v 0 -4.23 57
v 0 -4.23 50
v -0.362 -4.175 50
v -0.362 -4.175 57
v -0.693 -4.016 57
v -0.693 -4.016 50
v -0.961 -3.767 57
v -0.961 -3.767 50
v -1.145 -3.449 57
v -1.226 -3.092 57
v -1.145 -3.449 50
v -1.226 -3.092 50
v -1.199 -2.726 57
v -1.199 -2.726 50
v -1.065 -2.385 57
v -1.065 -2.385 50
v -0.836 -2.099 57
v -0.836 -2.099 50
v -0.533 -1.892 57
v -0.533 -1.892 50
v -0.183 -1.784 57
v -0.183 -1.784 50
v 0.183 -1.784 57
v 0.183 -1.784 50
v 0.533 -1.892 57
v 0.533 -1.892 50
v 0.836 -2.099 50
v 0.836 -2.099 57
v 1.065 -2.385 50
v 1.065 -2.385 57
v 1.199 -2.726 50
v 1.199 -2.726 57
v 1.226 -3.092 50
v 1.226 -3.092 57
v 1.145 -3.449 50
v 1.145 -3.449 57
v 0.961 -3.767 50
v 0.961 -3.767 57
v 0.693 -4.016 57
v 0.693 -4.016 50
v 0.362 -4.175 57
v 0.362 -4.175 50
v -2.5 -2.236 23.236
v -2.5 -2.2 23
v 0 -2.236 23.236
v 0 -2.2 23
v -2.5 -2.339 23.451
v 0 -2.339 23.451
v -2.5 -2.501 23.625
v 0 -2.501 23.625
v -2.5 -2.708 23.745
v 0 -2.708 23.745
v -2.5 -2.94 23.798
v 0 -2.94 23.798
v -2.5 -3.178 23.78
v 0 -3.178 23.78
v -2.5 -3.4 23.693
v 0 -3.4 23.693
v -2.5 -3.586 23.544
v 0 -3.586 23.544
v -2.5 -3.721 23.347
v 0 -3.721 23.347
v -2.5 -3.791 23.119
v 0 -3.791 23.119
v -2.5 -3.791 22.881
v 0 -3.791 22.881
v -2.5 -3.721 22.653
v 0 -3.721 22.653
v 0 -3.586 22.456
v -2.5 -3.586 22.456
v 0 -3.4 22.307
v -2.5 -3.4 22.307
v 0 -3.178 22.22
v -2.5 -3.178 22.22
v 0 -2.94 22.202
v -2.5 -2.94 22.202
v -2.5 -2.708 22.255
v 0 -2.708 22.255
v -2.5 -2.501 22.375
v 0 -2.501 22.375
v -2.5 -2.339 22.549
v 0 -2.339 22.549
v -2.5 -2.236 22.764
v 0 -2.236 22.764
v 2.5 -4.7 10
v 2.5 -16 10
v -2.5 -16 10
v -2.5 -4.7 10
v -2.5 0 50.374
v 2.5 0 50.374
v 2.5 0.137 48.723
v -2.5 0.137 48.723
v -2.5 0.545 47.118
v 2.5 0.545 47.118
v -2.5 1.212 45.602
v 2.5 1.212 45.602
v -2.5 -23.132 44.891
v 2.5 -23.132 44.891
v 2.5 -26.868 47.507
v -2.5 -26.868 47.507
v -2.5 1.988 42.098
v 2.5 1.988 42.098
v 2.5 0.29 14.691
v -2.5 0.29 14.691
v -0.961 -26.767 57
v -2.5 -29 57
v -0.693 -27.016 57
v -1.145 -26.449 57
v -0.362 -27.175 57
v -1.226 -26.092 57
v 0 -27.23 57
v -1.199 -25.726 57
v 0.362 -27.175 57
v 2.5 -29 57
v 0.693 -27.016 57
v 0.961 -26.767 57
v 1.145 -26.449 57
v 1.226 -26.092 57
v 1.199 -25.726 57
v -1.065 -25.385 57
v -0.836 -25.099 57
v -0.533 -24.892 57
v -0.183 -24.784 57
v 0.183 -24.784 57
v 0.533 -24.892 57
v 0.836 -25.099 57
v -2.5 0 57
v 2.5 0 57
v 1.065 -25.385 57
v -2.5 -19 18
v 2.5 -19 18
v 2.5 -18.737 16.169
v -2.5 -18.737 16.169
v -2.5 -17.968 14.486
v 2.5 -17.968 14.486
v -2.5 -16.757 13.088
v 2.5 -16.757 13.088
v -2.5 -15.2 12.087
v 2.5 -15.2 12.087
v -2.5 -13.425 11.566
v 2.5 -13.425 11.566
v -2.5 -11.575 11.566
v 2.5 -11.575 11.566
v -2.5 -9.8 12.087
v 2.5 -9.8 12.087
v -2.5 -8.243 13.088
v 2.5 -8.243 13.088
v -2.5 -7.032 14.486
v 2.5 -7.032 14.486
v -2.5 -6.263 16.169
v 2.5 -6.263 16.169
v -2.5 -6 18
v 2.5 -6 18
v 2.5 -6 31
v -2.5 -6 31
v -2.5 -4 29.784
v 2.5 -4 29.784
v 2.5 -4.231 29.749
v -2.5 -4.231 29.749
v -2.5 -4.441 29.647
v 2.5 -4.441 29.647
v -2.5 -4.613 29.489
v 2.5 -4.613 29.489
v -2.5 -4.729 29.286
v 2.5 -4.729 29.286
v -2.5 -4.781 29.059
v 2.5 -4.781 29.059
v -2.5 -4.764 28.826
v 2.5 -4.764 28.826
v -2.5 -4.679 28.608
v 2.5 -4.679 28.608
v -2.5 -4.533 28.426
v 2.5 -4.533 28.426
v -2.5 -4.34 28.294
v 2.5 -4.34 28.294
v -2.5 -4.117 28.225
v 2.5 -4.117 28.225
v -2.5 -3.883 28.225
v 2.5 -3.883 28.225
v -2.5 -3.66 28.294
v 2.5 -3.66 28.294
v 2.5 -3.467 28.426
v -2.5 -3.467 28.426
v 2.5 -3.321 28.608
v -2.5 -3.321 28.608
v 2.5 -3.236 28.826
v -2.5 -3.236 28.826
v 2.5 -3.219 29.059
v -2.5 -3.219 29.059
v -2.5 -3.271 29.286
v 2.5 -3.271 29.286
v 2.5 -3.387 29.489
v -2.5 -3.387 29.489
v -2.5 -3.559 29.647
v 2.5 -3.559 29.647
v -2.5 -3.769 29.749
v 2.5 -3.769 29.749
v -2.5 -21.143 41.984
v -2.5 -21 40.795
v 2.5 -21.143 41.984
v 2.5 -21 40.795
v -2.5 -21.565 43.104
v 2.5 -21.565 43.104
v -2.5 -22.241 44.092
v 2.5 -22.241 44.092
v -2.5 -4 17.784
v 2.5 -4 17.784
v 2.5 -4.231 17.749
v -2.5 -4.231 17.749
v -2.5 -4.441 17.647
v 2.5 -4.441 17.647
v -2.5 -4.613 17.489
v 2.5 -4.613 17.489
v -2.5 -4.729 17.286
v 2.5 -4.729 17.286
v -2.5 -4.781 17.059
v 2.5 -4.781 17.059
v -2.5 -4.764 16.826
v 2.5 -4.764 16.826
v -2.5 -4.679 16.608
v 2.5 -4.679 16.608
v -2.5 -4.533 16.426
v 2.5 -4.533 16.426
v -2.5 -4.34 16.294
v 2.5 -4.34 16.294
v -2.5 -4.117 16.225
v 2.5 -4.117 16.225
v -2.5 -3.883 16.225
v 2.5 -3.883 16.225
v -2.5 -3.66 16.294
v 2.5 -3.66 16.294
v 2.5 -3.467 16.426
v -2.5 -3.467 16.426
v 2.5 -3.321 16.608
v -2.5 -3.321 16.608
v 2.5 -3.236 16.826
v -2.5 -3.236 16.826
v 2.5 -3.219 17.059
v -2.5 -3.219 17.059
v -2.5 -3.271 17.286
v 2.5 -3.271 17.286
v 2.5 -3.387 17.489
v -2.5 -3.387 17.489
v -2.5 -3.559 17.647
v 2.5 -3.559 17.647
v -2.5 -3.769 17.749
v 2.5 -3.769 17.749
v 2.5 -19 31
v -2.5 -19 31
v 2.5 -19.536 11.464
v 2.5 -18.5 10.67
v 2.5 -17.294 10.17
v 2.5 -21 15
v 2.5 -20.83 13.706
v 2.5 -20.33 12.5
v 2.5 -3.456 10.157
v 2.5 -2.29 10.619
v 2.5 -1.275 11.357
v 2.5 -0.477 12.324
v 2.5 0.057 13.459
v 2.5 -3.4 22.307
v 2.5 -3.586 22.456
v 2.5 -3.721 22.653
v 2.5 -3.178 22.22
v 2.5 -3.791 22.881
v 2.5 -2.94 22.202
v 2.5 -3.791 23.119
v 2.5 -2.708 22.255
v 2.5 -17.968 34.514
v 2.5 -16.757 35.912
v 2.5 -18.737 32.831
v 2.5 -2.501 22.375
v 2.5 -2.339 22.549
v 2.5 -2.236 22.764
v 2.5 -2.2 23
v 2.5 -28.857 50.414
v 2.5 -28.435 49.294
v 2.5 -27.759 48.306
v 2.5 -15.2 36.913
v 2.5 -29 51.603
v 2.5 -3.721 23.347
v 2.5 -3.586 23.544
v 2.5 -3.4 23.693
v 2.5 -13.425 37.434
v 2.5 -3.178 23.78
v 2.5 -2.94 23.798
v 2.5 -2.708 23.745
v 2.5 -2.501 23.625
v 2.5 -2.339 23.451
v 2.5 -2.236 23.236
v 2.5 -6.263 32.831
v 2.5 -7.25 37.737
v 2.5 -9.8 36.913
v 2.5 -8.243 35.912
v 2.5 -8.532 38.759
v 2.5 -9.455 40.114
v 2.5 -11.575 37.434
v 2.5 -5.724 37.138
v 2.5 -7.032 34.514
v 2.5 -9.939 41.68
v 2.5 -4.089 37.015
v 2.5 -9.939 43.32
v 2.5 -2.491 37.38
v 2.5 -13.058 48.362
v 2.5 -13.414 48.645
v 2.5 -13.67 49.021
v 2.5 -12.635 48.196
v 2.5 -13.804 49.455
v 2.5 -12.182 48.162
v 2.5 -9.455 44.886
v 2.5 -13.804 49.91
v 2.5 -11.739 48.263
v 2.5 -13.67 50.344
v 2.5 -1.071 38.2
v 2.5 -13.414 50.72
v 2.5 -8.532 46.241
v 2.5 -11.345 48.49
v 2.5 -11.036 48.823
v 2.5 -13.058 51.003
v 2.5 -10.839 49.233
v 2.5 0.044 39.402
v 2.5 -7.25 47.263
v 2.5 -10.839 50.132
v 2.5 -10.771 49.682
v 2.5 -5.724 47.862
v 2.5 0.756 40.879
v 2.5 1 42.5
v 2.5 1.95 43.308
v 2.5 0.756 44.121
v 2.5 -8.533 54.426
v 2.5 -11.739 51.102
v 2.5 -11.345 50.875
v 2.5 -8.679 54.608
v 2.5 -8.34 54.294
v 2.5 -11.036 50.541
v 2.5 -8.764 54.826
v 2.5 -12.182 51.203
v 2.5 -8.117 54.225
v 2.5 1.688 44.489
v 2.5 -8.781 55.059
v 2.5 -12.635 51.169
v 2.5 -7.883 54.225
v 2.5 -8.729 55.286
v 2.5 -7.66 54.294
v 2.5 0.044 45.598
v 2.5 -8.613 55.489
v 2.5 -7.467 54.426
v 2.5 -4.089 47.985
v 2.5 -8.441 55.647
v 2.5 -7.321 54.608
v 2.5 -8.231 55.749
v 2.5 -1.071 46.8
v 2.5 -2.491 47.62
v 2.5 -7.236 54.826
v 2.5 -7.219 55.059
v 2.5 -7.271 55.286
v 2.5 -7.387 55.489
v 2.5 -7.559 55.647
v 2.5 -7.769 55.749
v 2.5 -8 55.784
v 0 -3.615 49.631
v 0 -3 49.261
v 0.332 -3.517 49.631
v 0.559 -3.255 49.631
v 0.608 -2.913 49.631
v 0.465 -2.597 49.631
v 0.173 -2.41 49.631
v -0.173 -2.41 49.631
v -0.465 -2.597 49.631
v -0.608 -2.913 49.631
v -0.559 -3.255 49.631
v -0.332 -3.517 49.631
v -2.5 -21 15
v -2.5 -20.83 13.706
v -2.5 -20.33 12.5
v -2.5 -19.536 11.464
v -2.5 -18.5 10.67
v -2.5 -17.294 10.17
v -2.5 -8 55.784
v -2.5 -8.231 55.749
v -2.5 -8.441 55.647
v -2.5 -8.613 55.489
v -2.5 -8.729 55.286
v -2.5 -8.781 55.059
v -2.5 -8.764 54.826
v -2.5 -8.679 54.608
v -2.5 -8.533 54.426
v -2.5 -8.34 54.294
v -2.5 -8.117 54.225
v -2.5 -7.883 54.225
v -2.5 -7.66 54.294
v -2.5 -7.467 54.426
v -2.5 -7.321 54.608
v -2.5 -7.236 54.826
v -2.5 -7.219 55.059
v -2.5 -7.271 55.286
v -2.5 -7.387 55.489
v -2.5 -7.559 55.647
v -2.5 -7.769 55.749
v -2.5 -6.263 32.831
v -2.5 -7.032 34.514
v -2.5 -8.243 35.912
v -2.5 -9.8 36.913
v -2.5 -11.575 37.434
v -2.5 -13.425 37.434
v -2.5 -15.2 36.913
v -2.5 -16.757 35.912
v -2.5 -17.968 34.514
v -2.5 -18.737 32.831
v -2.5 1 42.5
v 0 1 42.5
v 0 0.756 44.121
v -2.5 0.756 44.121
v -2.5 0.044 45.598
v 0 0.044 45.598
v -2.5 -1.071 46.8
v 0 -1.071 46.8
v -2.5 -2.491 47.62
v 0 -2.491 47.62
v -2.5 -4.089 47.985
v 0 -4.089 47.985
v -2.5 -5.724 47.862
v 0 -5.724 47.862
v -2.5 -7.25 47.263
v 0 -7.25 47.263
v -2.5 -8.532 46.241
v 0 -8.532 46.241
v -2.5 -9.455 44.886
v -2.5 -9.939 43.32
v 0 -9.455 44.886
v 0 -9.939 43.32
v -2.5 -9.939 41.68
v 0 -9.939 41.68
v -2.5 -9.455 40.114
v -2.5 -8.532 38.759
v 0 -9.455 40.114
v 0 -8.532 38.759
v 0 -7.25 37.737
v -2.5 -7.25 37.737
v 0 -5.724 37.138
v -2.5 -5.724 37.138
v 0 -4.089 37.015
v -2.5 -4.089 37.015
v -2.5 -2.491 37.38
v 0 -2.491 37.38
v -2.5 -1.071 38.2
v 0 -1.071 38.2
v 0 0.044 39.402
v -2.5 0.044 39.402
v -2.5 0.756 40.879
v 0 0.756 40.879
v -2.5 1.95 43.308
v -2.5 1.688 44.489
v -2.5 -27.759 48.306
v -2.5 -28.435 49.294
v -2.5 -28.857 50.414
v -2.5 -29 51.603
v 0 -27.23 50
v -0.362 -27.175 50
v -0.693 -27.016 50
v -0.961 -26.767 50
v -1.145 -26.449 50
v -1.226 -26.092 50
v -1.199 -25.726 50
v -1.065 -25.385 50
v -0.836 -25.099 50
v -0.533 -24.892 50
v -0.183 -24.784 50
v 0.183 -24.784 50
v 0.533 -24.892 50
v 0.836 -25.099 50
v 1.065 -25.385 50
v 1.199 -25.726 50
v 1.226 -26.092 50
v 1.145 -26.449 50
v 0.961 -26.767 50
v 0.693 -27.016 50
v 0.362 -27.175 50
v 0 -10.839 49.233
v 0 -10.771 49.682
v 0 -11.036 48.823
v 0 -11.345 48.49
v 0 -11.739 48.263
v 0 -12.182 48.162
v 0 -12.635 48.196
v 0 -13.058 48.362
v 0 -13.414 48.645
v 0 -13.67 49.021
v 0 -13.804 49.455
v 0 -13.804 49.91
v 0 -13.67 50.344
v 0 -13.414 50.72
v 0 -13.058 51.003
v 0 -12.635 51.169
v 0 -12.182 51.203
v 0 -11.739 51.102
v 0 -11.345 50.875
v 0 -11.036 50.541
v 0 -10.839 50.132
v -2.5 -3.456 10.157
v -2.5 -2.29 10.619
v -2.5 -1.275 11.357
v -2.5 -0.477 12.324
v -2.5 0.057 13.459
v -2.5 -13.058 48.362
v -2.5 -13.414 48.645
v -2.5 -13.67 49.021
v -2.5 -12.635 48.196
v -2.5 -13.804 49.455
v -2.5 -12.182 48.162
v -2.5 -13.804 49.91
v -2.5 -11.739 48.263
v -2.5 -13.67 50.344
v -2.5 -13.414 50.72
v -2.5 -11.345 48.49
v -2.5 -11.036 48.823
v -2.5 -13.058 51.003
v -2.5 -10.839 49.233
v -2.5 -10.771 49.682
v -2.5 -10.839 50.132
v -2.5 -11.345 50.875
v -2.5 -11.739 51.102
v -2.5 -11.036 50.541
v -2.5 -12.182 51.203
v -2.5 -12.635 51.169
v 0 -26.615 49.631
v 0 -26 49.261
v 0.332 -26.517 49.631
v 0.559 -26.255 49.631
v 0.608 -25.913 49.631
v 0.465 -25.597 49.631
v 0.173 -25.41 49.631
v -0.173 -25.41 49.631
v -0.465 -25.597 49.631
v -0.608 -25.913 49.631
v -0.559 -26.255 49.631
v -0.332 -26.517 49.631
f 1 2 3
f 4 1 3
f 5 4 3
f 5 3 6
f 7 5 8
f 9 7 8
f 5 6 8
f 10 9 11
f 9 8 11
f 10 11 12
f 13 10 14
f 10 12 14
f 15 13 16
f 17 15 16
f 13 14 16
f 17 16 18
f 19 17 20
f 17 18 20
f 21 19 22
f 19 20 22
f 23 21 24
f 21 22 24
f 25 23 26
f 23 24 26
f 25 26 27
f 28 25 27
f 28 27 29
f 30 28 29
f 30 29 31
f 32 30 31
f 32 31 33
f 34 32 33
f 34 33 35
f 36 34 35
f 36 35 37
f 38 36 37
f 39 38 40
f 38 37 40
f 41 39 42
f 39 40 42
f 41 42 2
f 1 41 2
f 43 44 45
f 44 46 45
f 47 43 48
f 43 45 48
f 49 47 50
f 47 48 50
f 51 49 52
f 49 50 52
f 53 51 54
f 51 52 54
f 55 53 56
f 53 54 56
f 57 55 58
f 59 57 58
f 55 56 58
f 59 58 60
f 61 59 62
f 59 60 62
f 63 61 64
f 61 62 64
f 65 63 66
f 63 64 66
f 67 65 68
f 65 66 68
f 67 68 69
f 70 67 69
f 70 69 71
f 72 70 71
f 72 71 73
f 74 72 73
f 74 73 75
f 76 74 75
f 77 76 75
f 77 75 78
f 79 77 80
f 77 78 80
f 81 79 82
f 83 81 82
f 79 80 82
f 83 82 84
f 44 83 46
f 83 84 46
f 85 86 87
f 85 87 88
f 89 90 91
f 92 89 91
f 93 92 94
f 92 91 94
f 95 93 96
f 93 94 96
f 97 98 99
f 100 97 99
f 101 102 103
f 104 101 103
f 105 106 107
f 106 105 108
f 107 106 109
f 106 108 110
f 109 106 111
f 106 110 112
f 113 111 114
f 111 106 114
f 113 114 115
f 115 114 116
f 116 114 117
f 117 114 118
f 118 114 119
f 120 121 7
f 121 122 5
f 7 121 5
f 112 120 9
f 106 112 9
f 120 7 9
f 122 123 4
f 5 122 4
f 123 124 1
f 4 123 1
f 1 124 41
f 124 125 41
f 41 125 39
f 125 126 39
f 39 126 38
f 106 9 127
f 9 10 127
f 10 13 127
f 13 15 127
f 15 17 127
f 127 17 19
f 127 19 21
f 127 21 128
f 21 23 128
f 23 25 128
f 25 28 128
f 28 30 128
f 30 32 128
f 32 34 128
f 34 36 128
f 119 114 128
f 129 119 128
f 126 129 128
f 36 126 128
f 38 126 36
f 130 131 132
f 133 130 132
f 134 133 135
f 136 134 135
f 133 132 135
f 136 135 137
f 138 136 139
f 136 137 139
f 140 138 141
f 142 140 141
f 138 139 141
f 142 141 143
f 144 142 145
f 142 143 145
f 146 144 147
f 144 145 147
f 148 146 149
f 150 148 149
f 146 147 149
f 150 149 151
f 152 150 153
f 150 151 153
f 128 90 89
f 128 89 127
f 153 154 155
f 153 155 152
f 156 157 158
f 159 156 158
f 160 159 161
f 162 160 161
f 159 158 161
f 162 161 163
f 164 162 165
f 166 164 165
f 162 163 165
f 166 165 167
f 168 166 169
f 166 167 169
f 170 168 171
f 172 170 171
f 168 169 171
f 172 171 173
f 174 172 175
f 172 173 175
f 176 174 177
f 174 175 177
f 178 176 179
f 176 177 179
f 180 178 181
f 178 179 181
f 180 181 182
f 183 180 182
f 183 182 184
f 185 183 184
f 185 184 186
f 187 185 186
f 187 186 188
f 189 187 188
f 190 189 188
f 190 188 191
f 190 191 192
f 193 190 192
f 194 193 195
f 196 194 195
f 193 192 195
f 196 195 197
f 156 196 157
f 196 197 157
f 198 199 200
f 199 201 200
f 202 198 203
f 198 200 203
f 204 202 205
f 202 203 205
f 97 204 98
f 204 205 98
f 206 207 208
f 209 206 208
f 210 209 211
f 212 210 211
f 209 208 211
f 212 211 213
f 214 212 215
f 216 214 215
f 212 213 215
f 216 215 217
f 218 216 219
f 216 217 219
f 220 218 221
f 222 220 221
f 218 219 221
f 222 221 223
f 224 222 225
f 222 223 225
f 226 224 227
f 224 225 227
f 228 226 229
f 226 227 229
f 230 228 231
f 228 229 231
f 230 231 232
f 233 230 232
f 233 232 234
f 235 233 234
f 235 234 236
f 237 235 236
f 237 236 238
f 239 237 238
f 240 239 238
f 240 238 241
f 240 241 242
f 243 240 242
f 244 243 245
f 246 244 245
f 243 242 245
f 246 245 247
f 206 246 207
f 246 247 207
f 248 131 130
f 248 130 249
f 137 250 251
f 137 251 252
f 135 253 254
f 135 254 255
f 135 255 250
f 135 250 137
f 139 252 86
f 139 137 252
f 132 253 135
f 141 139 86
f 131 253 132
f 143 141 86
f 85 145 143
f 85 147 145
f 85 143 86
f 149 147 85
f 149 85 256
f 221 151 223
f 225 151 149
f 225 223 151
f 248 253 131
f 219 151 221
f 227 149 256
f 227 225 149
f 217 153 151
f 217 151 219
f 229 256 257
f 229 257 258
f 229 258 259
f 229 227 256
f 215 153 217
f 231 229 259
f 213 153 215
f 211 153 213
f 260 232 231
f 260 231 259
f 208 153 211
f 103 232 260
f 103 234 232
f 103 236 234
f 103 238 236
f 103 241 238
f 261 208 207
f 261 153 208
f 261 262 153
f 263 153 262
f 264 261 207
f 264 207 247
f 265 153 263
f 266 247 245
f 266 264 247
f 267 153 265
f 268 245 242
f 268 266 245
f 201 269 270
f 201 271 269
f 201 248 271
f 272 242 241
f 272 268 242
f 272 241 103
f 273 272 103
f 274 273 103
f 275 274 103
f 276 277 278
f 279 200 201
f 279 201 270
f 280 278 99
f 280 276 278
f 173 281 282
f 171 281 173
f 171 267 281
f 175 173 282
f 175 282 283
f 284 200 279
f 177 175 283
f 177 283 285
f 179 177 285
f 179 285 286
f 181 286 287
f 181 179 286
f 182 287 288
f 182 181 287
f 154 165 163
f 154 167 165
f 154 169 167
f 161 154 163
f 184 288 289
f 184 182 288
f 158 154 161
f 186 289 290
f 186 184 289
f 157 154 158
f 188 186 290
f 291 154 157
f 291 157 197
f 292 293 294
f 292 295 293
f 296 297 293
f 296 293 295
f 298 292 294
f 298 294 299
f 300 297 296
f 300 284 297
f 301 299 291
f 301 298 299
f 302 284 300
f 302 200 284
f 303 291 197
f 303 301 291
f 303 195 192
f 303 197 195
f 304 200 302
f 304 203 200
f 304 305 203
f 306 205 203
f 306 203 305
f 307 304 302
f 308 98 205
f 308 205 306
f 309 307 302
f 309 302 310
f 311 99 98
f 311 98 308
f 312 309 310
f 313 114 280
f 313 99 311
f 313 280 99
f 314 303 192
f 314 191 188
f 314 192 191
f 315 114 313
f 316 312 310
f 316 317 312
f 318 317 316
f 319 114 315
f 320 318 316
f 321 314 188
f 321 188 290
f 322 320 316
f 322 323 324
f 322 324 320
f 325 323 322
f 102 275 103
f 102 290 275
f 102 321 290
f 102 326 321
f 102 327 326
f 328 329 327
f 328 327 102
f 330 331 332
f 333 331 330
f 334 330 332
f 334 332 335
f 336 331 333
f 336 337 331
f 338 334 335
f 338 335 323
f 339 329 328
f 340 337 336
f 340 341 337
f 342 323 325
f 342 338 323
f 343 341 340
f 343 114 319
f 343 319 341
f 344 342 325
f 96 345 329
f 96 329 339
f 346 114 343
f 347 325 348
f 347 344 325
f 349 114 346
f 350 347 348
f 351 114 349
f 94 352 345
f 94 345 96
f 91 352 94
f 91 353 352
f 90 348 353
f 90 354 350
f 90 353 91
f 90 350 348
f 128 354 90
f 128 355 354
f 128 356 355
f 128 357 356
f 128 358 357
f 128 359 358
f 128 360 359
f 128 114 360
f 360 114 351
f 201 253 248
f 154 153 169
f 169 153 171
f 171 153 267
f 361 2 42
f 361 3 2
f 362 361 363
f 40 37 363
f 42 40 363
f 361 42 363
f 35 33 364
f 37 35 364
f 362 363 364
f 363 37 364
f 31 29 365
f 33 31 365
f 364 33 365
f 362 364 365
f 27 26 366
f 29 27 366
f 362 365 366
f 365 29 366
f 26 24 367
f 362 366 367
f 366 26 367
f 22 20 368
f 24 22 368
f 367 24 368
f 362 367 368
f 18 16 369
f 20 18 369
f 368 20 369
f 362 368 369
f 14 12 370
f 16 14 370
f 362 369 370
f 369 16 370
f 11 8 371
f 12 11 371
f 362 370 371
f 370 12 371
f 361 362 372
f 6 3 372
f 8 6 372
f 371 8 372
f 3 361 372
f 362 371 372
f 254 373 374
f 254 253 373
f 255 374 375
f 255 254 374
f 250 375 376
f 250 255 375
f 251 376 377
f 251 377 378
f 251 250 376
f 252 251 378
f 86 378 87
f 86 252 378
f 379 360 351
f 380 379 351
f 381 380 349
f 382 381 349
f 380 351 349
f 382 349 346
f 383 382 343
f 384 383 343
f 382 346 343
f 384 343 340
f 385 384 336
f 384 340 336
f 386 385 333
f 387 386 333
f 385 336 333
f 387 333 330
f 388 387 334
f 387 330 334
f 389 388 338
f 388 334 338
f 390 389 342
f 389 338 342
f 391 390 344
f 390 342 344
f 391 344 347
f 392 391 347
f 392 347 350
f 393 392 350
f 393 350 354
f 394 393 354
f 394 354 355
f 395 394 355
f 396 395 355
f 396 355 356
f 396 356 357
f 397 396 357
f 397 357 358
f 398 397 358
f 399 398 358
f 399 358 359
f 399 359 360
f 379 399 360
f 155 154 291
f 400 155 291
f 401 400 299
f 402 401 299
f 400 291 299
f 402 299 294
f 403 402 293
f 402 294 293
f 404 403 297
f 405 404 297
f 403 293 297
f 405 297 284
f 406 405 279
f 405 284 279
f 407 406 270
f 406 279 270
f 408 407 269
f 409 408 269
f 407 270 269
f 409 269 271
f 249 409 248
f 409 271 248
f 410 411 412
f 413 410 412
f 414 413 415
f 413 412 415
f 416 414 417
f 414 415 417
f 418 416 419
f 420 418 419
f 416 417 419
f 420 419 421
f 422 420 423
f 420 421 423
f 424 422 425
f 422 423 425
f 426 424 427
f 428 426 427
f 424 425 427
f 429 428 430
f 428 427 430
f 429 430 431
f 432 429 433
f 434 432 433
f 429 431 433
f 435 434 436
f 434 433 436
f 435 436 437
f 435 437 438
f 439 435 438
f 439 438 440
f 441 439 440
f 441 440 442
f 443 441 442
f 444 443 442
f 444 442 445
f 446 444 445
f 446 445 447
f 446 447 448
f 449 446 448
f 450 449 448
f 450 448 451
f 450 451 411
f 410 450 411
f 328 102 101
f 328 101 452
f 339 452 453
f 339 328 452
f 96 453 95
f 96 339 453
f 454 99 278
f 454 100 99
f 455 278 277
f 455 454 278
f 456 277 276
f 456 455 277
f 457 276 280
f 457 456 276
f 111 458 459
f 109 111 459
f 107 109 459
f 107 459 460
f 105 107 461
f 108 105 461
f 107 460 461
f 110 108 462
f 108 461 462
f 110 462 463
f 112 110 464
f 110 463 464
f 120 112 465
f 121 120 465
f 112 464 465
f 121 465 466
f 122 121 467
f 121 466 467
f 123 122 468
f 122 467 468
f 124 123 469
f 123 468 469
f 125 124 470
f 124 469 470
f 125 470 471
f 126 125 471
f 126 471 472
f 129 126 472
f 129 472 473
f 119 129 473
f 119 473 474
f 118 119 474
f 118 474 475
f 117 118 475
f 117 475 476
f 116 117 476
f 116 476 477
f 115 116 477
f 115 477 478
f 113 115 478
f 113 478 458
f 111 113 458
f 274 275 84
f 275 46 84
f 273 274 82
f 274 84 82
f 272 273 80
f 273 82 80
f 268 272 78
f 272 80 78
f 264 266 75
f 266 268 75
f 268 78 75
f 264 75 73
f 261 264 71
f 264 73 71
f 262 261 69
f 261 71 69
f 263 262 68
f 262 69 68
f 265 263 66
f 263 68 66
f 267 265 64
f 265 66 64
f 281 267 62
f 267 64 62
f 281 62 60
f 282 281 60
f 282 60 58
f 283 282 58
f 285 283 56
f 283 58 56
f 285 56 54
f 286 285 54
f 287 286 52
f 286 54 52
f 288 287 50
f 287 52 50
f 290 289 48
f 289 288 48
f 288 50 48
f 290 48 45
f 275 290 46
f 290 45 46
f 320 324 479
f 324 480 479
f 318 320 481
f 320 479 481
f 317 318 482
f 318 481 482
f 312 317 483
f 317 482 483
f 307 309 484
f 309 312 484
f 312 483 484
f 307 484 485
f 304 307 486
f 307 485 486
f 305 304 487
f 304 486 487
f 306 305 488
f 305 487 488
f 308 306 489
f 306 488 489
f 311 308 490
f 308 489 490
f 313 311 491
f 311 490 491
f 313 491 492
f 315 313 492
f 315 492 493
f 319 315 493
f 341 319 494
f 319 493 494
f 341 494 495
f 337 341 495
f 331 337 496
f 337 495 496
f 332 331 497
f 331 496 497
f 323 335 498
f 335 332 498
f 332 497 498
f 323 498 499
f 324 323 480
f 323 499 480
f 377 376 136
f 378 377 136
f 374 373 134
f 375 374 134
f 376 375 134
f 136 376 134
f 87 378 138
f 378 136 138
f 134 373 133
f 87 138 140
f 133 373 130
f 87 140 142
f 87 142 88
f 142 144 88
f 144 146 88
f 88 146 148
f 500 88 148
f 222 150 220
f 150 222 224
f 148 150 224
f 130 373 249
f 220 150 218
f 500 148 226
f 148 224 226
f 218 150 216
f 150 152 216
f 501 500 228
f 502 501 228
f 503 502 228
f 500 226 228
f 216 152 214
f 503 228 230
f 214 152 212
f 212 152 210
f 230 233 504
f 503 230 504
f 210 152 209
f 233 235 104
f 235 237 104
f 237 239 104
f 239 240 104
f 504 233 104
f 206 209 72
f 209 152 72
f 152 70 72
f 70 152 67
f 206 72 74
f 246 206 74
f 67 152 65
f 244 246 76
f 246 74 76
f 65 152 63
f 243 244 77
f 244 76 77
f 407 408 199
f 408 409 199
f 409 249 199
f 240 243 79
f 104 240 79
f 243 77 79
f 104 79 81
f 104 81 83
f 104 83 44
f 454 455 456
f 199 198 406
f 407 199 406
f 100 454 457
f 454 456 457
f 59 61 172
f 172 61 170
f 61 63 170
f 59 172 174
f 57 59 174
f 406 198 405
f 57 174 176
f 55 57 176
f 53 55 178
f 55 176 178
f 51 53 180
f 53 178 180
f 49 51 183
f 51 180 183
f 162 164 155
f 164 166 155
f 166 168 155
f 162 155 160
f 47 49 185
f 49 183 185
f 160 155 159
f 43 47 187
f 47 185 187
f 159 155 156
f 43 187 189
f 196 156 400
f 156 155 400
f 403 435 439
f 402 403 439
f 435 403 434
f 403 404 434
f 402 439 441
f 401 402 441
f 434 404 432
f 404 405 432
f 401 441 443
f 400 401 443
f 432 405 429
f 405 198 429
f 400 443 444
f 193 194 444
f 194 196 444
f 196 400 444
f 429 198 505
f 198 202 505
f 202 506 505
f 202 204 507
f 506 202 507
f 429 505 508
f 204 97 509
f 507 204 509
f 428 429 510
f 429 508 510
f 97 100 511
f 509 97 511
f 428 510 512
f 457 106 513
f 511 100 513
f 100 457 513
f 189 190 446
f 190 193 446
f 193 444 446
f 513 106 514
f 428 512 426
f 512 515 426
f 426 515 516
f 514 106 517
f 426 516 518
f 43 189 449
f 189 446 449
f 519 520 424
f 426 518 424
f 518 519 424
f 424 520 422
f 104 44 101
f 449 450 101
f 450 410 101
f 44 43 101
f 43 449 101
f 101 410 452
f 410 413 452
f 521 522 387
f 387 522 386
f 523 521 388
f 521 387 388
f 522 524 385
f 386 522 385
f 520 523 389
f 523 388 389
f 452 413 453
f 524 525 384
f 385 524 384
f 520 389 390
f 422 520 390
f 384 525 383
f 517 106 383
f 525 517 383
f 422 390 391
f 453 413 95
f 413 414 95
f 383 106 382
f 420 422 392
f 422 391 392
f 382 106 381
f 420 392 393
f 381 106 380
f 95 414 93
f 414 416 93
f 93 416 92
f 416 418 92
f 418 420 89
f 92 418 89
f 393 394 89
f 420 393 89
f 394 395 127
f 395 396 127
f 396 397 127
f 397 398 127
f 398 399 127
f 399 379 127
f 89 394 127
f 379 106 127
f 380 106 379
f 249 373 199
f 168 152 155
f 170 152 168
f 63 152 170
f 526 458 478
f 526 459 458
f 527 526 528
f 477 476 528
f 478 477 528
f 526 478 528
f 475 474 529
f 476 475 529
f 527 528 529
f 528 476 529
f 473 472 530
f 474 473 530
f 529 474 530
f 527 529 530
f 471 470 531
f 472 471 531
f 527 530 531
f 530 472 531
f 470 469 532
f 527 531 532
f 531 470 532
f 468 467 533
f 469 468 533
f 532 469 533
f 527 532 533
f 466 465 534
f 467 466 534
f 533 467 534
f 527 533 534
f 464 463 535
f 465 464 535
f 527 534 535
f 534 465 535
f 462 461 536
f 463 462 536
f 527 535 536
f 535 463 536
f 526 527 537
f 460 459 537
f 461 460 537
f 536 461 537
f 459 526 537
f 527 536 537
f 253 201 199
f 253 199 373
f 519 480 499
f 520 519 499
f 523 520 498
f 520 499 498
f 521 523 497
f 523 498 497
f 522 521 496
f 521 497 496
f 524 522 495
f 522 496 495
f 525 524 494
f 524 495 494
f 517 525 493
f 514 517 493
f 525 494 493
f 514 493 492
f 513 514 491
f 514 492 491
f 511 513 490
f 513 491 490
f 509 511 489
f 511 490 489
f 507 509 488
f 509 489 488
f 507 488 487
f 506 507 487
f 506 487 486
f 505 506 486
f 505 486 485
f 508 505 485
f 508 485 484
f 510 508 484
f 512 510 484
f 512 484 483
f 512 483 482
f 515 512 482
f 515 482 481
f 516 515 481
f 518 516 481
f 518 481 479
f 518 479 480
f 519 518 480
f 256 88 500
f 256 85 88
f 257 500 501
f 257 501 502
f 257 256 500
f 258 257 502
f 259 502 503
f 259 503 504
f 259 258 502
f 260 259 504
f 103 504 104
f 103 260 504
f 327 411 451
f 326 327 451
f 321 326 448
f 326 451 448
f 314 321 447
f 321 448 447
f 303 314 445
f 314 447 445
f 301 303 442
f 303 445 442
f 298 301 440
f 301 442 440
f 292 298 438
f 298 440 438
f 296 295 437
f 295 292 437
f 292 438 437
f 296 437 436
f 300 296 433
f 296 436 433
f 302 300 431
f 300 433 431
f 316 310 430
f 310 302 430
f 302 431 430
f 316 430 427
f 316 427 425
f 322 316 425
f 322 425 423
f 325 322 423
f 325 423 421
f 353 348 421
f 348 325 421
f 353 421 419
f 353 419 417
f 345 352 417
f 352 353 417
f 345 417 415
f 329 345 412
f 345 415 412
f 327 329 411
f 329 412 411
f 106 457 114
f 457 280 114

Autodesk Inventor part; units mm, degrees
ref_plane "YZ Plane" through (0, 0, 0) normal (1, 0, 0) x (0, 1, 0)
ref_plane "XZ Plane" through (0, 0, 0) normal (0, 1, 0) x (-1, 0, 0)
ref_plane "XY Plane" through (0, 0, 0) normal (0, 0, 1) x (1, 0, 0)
sketch "Skizze1" plane through (0, 0, 0) normal (1, 0, 0) x (0, 1, 0)
  circle A0 centre (-22.8, 48.7) radius 11 construction
  line L0 (-97.7565, 0) -> (58.6427, 0) projected
  circle A1 centre (14.8, 21.5) radius 21.5 construction
  line L1 (0, 10) -> (0, 33.674) construction
  line L2 (-6.7, 0) -> (-6.7, 21.5) construction
  circle A2 centre (-4.5, 42.5) radius 5 construction
  line L3 (-56.6136, 29) -> (0, 29) construction
  line L4 (-75.4137, 30) -> (0, 30) construction
  line L5 (-21, 43.3983) -> (-29, 49)
  line L6 (-29, 49) -> (-29, 57)
  circle A3 centre (-4.5, 42.5) radius 5.5
  circle A4 centre (-22.8, 48.7) radius 0.5
  circle A5 centre (-3, 23) radius 0.8
  line L7 (14.8, 21.5) -> (-6.7, 21.5) construction
  line L8 (-29, 57) -> (0, 57)
  line L9 (14.8, 21.5) -> (14.8, 20.5) construction
  line L10 (14.8, 20.5) -> (-4.5, 42.5) construction
  circle A6 centre (-22.8, 48.7) radius 4.95 construction
  circle A7 centre (-12.2958, 49.6823) radius 5.6 construction
  circle A8 centre (-12.2958, 49.6823) radius 6.3 construction
  circle A9 centre (-12.2958, 49.6823) radius 1.525
  line L11 (0, 50.374) -> (0, 57)
  line L12 (-21, 43.3983) -> (-21, 10)
  line L13 (-21, 10) -> (0, 10)
  arc A10 (1.9876, 42.0983) -> (1.2121, 45.6019) centre (-4.5, 42.5) ccw
  line L14 (1.9876, 42.0983) -> (0, 10)
  arc A11 (0, 50.374) -> (1.2121, 45.6019) centre (10, 50.374) ccw
  line L15 (-12.5, 18) -> (-12.5, 31) construction
  line L16 (-19, 18) -> (-19, 31)
  line L17 (-6, 31) -> (-6, 18)
  arc A12 (-19, 18) -> (-6, 18) centre (-12.5, 18) ccw
  arc A13 (-6, 31) -> (-19, 31) centre (-12.5, 31) ccw
  point P0 (0, 0)
  point P1 (-12.5, 24.5)
  dimension "d4" = 43
  dimension "d0" = 22
  dimension "d6" = 6.7
  dimension "d8" = 10
  dimension "d9" = 29
  dimension "d11" = 30
  dimension "d19" = 29
  dimension "d20" = 11
  dimension "d33" = 1
  dimension "d34" = 48.7
  dimension "d36" = 1.6
  dimension "d37" = 3
  dimension "d54" = 57
  dimension "d58" = 1
  dimension "d65" = 9.9
  dimension "d66" = 11.2
  dimension "d67" = 0.7
  dimension "d68" = 3.05
  dimension "d73" = 22.8
  dimension "d100" = 10.5042
  dimension "d101" = 0.9823
  dimension "d102" = 0
  dimension "d103" = 8.3
  dimension "d104" = 21
  dimension "d107" = 10
  dimension "d110" = 8
  dimension "d111" = 55
  dimension "d112" = 13
  dimension "d113" = 10
  dimension "d114" = 42.5
  dimension "d115" = 34
  dimension "d116" = 21
  dimension "d131" = 13
  dimension "d132" = 13
  dimension "d133" = 12.5
  dimension "d134" = 18
  dimension "d135" = 4.5
  dimension "d136" = 10.55
extrude "Extrusion1" add sketch "Skizze1" along normal mid plane 5 contours L5 L6 L8 L11 A11 A10 L14 L13 L12 | A4
sketch "Skizze2" plane through (-2.5, -29, 57) normal (0, 0, 1) x (1, 0, 0)
  line L0 (0, 0) -> (5, 0) projected
  line L1 (5, 5) -> (5, 0) projected
  line L2 (0, 0) -> (0, 5) projected
  line L3 (2.5, 29) -> (2.5, 0) construction
  line L4 (0, 0) -> (5, 0) construction
  line L5 (0, 5) -> (5, 5) projected
  line L6 (0, 29) -> (5, 29) projected
  line L7 (0, 29) -> (5, 29) projected
  point P0 (2.5, 26)
  point P1 (2.5, 3)
  dimension "d25" = 23
  dimension "d74" = 3
hole "Bohrung1" at (0, -3, 57) at (0, -26, 57) direction (0, 0, -1) diameter 2.459 depth 7 tip angle 118 thread size "M3x0.5" class "6H" standard "ISO Metric profile"
sketch "Skizze3" plane through (-2.5, 0, 0) normal (-1, 0, 0) x (0, 0, 1)
  circle A0 centre (23, -3) radius 0.8 projected
  line L0 (29, -4) -> (17, -4) construction
  circle A1 centre (23, -3) radius 0.8 construction
  line L1 (23, -4) -> (23, -3) construction
  point P0 (0, 0)
  point P1 (55, -8)
  dimension "d38" = 12
  dimension "d39" = 1
  dimension "d40" = 32
  dimension "d41" = 5
hole "Bohrung2" at (-2.5, -4, 17) at (-2.5, -4, 29) at (-2.5, -8, 55) direction (1, 0, 0) diameter 1.567 end through all thread size "M2x0.4" class "6H" standard "ISO Metric profile"
fillet "Rundung3" radius 5 4 edges at (0, 0, 10) (0, -21, 10) (0, -21, 43.3983) (0, -29, 49)
properties part number "Dribbler Seite v2" material "Aluminium 6061"
